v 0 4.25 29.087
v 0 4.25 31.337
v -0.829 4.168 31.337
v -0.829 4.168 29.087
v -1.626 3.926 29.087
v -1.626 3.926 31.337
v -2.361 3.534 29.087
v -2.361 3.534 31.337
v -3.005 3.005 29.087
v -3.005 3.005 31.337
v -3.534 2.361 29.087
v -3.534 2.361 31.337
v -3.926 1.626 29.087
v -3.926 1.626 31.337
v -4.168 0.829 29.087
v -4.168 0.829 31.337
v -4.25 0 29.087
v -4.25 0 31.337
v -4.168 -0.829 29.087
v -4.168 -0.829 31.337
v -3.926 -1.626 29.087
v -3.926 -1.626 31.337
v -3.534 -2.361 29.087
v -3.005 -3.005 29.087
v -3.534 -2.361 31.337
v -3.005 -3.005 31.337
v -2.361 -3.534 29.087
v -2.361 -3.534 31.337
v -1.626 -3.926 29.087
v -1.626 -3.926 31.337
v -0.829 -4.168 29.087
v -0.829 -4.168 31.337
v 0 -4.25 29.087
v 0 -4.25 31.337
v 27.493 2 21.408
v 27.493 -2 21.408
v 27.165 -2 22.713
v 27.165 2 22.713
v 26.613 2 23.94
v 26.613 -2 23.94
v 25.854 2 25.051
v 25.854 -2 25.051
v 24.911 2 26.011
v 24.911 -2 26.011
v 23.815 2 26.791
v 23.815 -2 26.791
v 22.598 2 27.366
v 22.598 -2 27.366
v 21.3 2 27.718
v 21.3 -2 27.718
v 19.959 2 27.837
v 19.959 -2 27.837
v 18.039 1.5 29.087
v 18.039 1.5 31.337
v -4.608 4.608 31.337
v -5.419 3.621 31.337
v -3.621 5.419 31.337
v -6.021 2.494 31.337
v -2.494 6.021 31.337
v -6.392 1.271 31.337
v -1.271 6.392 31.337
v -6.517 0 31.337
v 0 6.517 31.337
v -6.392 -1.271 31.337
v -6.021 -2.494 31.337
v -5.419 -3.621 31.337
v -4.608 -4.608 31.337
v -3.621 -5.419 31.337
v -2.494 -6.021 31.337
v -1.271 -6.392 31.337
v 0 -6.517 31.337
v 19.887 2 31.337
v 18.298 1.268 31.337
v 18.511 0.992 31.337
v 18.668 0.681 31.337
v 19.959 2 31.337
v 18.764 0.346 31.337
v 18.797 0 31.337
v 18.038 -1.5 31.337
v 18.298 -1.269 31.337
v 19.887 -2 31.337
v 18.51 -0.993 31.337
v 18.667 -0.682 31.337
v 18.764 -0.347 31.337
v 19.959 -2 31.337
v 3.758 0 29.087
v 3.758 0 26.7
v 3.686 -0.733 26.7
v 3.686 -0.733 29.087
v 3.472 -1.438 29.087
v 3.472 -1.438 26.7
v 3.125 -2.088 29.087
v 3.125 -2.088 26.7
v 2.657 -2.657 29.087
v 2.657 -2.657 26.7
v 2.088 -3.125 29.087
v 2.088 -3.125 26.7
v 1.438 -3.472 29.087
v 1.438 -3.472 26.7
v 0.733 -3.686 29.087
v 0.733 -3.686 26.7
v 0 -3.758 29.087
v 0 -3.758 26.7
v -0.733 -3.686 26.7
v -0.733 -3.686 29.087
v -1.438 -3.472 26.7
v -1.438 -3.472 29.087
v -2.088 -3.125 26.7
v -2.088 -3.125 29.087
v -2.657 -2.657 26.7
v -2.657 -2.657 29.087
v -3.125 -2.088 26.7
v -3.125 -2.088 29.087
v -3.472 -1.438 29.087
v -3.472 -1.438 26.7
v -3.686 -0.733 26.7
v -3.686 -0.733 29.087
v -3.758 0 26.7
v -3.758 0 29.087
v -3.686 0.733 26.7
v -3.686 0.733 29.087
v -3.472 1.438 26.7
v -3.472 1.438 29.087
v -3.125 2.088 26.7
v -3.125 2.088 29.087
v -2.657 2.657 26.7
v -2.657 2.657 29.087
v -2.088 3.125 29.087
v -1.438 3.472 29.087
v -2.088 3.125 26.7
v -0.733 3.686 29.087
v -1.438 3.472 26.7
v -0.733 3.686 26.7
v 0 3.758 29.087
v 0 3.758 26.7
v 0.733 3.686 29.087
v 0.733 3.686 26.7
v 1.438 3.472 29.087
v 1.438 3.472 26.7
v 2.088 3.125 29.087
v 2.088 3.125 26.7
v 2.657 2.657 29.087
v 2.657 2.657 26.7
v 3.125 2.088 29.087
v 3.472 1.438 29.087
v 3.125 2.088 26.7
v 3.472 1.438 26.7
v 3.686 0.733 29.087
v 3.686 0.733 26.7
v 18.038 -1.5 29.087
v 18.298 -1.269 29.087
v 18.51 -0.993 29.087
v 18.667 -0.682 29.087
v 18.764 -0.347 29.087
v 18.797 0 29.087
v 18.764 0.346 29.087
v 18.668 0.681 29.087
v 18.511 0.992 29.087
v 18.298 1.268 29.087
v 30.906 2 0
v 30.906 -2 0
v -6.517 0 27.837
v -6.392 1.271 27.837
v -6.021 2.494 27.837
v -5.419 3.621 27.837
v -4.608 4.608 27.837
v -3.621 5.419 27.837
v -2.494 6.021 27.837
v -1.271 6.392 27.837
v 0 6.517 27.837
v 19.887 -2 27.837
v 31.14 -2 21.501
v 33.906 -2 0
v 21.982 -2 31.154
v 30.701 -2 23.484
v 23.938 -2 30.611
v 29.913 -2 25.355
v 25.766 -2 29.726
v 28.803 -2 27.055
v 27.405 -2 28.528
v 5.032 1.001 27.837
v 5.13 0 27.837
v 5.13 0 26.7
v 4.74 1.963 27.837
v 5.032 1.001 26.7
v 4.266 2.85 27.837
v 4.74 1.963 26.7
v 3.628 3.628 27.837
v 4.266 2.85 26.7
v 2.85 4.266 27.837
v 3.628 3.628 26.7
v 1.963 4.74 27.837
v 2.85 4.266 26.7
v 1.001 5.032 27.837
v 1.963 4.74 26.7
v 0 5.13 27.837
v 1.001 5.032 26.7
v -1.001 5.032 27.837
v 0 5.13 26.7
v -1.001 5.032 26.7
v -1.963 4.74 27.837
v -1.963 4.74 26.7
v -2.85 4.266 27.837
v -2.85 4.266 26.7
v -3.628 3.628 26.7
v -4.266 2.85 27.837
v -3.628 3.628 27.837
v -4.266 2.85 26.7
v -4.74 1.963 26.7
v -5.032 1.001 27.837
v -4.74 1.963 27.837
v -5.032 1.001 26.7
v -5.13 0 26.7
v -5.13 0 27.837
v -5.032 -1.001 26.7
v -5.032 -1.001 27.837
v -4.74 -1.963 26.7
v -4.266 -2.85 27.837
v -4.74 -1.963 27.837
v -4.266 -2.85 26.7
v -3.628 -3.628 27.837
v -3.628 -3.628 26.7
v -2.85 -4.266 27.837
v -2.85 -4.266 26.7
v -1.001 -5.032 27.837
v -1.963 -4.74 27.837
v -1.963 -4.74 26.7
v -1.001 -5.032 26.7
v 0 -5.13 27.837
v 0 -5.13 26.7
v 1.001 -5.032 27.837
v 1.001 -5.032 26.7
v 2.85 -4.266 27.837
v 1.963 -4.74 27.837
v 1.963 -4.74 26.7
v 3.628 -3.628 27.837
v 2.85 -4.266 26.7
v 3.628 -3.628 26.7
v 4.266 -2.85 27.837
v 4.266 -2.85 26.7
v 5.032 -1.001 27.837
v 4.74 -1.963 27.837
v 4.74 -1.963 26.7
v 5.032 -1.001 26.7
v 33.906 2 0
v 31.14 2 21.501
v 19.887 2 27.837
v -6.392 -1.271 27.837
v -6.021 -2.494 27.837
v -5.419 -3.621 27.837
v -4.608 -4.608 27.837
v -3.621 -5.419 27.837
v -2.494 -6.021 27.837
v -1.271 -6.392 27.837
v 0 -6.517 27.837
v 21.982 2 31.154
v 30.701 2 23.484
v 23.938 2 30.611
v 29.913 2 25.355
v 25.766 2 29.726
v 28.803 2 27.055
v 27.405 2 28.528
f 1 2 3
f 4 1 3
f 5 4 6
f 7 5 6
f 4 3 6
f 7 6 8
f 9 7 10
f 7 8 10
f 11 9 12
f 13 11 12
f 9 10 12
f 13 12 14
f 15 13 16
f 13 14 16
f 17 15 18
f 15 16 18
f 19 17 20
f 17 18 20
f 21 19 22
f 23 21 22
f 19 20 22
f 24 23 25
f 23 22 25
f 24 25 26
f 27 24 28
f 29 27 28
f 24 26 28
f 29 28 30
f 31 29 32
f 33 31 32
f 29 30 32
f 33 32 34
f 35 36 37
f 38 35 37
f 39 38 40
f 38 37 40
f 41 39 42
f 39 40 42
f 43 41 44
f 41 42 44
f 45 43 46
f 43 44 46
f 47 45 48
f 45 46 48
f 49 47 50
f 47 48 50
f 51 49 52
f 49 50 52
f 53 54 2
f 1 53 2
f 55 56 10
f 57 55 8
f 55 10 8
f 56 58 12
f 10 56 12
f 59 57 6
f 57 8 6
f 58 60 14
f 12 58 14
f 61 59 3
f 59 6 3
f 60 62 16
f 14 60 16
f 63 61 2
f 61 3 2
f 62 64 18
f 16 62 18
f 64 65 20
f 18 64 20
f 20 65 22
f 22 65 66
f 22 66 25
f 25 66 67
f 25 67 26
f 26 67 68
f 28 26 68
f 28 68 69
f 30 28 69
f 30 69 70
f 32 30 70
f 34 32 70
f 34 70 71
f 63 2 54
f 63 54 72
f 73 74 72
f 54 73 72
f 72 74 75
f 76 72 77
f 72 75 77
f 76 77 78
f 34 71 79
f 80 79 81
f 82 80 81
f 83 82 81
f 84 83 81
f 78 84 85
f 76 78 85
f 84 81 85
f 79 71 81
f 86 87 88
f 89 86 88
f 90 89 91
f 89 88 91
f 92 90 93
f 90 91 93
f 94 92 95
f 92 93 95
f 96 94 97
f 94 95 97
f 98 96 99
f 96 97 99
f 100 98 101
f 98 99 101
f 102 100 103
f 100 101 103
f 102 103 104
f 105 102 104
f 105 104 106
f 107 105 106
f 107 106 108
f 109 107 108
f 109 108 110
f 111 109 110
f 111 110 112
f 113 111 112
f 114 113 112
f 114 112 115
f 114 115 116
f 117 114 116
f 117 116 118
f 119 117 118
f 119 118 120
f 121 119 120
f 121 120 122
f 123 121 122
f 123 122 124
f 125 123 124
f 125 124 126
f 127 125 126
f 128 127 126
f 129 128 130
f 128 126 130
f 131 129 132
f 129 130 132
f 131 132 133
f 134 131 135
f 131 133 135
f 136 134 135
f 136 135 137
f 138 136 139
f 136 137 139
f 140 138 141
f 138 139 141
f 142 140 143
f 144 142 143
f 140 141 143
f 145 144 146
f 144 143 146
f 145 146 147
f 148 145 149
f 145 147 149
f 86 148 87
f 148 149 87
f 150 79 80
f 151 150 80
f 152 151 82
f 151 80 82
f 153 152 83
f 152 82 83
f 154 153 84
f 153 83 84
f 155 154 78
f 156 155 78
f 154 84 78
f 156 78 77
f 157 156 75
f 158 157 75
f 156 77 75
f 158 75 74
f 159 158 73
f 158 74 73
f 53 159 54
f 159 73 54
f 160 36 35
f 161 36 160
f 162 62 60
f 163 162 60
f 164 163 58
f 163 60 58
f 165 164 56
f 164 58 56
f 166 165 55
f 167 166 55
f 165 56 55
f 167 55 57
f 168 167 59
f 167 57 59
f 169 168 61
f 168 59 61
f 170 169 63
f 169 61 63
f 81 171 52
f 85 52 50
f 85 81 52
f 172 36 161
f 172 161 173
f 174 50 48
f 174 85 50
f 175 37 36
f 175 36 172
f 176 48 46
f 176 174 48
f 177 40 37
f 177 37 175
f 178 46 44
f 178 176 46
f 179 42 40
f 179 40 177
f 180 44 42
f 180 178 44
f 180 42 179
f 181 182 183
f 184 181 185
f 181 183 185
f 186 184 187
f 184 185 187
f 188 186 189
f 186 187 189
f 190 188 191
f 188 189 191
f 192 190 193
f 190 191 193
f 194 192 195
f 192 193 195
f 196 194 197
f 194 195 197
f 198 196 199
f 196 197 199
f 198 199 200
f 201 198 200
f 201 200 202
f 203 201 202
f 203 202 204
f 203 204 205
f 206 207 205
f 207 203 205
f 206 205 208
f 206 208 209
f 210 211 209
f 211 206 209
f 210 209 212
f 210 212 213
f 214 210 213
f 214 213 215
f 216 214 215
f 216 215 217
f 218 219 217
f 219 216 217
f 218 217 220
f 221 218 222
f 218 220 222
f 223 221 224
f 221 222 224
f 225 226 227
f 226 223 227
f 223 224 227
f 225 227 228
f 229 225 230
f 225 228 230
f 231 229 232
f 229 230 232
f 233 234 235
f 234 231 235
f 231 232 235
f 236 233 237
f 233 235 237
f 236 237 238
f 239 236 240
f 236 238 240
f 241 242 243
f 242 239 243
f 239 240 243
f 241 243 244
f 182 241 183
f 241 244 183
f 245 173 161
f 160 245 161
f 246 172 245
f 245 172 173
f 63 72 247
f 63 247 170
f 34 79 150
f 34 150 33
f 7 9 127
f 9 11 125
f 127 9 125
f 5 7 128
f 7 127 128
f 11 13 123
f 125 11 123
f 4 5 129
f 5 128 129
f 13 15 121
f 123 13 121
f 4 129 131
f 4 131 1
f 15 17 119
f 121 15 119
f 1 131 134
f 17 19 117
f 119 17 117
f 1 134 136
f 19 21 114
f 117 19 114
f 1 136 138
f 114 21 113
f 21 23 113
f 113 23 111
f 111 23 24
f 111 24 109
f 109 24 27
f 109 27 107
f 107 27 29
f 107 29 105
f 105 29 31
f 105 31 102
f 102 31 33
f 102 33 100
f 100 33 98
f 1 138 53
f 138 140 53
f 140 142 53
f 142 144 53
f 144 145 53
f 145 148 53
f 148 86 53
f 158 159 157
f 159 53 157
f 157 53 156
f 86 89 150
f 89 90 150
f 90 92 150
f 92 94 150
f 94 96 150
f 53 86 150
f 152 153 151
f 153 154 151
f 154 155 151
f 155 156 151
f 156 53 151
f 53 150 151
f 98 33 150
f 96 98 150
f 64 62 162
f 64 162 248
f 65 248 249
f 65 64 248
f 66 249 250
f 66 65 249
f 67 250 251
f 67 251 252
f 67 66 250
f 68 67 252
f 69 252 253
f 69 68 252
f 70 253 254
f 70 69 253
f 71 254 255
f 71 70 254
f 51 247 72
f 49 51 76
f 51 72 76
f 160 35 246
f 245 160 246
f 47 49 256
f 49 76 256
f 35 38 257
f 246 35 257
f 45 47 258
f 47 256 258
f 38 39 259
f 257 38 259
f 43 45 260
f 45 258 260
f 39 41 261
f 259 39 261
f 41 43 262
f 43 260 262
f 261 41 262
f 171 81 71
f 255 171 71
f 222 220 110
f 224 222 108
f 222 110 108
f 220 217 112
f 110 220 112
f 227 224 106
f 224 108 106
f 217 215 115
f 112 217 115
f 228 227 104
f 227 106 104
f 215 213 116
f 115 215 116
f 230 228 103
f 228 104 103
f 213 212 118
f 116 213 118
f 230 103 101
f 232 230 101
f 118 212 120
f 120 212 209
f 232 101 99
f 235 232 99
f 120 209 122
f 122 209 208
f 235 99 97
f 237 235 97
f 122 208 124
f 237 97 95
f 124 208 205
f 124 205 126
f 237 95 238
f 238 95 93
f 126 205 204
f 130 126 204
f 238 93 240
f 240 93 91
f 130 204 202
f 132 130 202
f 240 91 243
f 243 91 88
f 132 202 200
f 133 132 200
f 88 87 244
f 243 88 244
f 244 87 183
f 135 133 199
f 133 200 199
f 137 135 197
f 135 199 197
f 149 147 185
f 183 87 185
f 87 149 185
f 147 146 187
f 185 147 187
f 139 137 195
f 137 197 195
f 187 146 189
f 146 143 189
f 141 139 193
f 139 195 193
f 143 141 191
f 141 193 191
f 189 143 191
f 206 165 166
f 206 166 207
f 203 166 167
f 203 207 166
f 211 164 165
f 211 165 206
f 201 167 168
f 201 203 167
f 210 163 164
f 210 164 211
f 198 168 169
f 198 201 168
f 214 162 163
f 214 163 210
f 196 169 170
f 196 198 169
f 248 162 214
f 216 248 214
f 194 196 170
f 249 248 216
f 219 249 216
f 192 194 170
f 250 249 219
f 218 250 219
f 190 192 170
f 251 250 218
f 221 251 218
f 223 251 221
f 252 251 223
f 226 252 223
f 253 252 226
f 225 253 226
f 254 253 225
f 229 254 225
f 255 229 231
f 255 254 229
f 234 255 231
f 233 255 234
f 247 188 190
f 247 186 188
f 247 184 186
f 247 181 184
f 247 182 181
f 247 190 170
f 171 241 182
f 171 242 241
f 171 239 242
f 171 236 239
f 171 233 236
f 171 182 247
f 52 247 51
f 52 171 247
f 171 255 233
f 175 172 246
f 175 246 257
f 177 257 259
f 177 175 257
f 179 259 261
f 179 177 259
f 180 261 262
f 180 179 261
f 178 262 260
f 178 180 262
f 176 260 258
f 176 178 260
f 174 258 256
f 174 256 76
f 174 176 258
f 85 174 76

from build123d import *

# Parameters (mm, degrees)
SKETCH008_R        = 5.130378
PAD006_DEPTH       = 1.2
PAD004_DEPTH       = 2
PAD005_DEPTH       = 3.5
POCKET_DEPTH       = 2.25
SKETCH009_R        = 3.757957
POCKET003002_DEPTH = 5


with BuildPart() as servo_support_cylinder001:
    # Sketch008 → Pad006 (new body)
    with BuildSketch(Plane.XY.offset(26.7)):
        Circle(SKETCH008_R)
    extrude(amount=PAD006_DEPTH)


with BuildPart() as servo_leg:
    # Sketch005 → Pad004 (new body, symmetric)
    with BuildSketch(Plane.XZ):
        with BuildLine():
            Line((-5.48246, 27.836502), (19.959321, 27.836502))
            ThreePointArc((27.493431, 21.408161), (24.91125, 26.011021), (19.959321, 27.836502))
            Line((27.493431, 21.408161), (30.905711, 0))
            Line((33.905711, 0), (30.905711, 0))
            Line((31.140427, 21.501308), (33.905711, 0))
            ThreePointArc((31.140427, 21.501308), (27.404927, 28.527815), (19.959321, 31.336502))
            Line((-5.48246, 31.336502), (19.959321, 31.336502))
            Line((-5.48246, 27.836502), (-5.48246, 31.336502))
        make_face()
    extrude(amount=PAD004_DEPTH, both=True)

    # Sketch006 → Pad005 (new body)
    with BuildSketch(Plane(origin=(0, 0, 31.336502), x_dir=(-1, 0, 0), z_dir=(0, 0, 1))):
        with BuildLine():
            Line((-19.908253, 1.9951), (0, 6.517084))
            ThreePointArc((6.517084, 0), (4.608274, 4.608274), (0, 6.517084))
            Line((6.517084, 0), (0, 0))
            Line((-19.908253, 0), (0, 0))
            Line((-19.908253, 1.9951), (-19.908253, 0))
        make_face()
    pad005 = extrude(amount=-PAD005_DEPTH)

    # Mirrored: Pad005 across Sketch006 H_Axis
    add(pad005.mirror(Plane(origin=(0, 0, 31.336502), x_dir=(0, 0, 1), z_dir=(0, -1, 0))))

    # Sketch007 → Pocket (cut)
    with BuildSketch(Plane(origin=(0, 0, 31.336502), x_dir=(-1, 0, 0), z_dir=(0, 0, 1))):
        with BuildLine():
            Line((-18.037807, 1.500282), (0, 4.25))
            ThreePointArc((2e-06, -4.25), (4.25, 1e-06), (0, 4.25))
            Line((-18.038573, -1.499718), (2e-06, -4.25))
            ThreePointArc((-18.037807, 1.500282), (-18.79662, 0.000476), (-18.038573, -1.499718))
        make_face()
    extrude(amount=-POCKET_DEPTH, mode=Mode.SUBTRACT)

    # Fusion007002: union servo_support_cylinder001
    add(servo_support_cylinder001.part)

    # Sketch009 → Pocket003002 (cut)
    with BuildSketch(Plane(origin=(0, 0, 26.7), x_dir=(1, 0, 0), z_dir=(0, 0, -1))):
        Circle(SKETCH009_R)
    extrude(amount=-POCKET003002_DEPTH, mode=Mode.SUBTRACT)


solid = servo_leg.part
